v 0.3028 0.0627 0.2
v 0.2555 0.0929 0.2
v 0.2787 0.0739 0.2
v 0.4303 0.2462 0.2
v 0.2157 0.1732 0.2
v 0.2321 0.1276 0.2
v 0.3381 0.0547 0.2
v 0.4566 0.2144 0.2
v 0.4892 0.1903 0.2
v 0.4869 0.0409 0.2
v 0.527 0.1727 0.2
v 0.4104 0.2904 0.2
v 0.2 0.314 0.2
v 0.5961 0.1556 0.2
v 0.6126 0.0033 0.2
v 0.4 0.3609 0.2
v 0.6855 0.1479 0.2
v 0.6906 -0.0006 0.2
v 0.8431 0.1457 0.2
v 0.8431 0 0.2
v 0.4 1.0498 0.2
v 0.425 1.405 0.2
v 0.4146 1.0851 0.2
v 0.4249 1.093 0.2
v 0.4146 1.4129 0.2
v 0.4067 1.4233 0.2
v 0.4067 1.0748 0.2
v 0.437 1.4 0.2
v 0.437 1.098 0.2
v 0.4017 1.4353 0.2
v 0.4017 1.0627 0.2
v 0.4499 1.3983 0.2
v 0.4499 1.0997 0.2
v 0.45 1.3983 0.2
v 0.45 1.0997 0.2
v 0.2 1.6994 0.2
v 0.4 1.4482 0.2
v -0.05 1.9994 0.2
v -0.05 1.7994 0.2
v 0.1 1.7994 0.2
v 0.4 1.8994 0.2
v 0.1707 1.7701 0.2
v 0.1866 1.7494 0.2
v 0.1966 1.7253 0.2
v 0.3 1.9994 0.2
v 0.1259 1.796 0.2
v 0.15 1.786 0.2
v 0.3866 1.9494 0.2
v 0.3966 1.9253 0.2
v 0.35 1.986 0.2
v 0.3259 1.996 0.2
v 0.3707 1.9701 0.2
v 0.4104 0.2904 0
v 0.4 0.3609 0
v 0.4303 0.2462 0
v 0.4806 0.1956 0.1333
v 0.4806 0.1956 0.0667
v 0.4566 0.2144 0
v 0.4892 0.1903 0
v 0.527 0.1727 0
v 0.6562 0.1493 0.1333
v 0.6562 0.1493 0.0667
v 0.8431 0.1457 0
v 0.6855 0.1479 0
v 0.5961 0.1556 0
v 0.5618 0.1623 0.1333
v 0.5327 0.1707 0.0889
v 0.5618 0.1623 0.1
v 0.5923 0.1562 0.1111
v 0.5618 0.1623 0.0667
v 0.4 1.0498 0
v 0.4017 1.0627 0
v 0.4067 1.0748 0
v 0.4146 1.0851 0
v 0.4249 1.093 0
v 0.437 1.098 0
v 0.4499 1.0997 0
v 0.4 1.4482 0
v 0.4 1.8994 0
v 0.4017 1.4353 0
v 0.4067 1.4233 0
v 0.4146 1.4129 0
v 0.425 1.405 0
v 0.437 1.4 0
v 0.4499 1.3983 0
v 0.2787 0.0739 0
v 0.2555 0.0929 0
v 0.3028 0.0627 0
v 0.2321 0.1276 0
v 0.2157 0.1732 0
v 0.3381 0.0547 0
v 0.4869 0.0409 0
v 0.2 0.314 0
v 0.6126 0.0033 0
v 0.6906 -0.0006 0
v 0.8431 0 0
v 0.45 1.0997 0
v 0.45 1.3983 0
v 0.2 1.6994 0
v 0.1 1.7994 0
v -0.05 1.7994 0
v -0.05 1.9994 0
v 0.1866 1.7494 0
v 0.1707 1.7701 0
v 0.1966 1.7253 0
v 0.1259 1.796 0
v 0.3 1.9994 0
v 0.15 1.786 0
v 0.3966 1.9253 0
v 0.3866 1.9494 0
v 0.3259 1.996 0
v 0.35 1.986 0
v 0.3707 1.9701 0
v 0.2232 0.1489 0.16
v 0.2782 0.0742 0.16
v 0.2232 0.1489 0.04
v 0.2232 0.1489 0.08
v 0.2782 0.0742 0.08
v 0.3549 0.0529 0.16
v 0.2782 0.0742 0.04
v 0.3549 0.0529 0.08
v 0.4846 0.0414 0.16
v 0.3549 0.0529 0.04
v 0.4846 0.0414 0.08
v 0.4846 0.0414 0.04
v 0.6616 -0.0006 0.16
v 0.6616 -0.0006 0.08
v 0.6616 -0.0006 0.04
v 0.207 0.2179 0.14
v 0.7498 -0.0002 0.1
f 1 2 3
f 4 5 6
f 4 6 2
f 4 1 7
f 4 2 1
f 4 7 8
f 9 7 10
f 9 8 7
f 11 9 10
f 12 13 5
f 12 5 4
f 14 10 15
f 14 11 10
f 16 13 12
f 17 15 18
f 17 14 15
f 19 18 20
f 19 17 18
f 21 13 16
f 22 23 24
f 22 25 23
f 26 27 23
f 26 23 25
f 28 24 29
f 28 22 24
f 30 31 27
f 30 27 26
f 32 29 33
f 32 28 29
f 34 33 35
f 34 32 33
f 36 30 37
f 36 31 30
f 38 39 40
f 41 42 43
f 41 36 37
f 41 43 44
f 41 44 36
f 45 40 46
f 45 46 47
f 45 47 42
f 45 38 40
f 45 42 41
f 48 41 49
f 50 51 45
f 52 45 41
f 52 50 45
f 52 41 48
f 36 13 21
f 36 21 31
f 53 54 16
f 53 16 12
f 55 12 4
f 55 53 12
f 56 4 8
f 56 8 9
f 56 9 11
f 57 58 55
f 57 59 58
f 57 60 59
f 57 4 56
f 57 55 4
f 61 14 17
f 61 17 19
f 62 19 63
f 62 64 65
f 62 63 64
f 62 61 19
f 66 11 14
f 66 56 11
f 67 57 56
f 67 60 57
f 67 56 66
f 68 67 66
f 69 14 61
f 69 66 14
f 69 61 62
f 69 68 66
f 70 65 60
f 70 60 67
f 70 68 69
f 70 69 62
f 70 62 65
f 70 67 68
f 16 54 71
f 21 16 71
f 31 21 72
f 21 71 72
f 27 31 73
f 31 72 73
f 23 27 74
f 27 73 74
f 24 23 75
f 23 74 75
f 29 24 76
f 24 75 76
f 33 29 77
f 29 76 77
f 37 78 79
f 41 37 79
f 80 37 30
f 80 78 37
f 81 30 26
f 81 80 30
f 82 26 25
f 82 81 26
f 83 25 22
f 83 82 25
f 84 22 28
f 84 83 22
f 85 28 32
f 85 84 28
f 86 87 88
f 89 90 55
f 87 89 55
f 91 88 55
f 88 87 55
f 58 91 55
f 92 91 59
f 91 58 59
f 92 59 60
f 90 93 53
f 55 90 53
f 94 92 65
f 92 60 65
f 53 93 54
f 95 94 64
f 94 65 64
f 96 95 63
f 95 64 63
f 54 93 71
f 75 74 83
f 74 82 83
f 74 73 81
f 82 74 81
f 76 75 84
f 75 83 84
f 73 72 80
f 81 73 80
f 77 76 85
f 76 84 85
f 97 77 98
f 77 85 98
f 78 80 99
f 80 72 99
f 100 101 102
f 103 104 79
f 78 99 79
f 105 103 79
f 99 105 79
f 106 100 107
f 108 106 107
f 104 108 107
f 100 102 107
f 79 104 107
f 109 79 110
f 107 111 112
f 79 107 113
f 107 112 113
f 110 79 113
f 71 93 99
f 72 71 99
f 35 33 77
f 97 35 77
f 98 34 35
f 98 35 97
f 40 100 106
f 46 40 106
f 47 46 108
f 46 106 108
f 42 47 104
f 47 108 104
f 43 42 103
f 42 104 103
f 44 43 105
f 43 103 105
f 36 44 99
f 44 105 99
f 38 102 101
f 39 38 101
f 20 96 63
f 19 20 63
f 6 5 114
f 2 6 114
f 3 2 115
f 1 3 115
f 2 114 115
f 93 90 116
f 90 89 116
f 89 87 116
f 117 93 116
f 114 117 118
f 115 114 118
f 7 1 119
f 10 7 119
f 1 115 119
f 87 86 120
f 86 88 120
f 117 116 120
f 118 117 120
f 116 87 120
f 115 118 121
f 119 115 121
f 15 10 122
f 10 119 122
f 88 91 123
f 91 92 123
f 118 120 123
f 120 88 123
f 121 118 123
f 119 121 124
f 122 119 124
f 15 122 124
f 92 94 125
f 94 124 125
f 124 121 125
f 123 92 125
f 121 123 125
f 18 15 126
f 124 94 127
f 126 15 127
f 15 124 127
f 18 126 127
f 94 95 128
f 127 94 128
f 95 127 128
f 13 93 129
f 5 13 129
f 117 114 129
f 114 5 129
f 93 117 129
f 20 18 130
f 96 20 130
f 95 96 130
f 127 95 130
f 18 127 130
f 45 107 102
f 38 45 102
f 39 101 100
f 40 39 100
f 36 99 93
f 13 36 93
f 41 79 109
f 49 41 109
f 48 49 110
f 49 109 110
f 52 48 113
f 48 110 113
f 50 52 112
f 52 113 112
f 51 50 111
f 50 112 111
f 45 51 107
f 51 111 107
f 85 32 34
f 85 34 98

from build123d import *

# Parameters (mm, degrees)
BOSS_EXTRUDE1_DEPTH = 0.2
SKETCH2_W           = 0.2
SKETCH2_H           = 0.298604146
BOSS_EXTRUDE2_DEPTH = 0.05
FILLET1_R           = 0.05


with BuildPart() as part:
    # Sketch1 → Boss-Extrude1 (new body)
    with BuildSketch(Plane.XY):
        with BuildLine():
            Line((0.2, 0.699374902), (0.2, 0.3139984))
            add(Edge.make_bspline(
                [(0.2, 0.3139984), (0.205117782, 0.01722479), (0.336091093, 0.065107428), (0.524474595, 0.036055776), (0.597315342, -0.000257939), (0.727358441, -0.001083087), (0.736855282, 0.000318751), (0.843149125, 0)],
                knots=[0, 0, 0, 0, 0.386744718, 0.431584631, 0.602654437, 0.661634346, 1, 1, 1, 1], degree=3))
            Line((0.843149125, 0), (0.843149125, 0.145674502))
            add(Edge.make_bspline(
                [(0.4, 0.3609291), (0.405330144, 0.110576826), (0.678357666, 0.153432989), (0.843149125, 0.145674502)],
                knots=[0, 0, 0, 0, 1, 1, 1, 1], degree=3))
            Line((0.4, 0.3609291), (0.4, 0.948501248))
            Line((0.4, 0.948501248), (0.4, 1.899374902))
            ThreePointArc((0.4, 1.899374902), (0.370710678, 1.97008558), (0.3, 1.999374902))
            Line((0.3, 1.999374902), (-0.05, 1.999374902))
            Line((-0.05, 1.999374902), (-0.05, 1.799374902))
            Line((-0.05, 1.799374902), (0.1, 1.799374902))
            ThreePointArc((0.1, 1.799374902), (0.170710678, 1.77008558), (0.2, 1.699374902))
            Line((0.2, 1.699374902), (0.2, 0.699374902))
        make_face()
    extrude(amount=BOSS_EXTRUDE1_DEPTH)

    # Sketch2 → Boss-Extrude2 (add)
    with BuildSketch(Plane(origin=(0.4, 0, 0), x_dir=(0, 0, -1), z_dir=(1, 0, 0))):
        with Locations((-0.1, 1.249020091)):
            Rectangle(SKETCH2_W, SKETCH2_H)
    extrude(amount=BOSS_EXTRUDE2_DEPTH)

    # Fillet1
    fillet1_edges = [part.edges().sort_by_distance(p)[0] for p in [
        (0.4, 1.099718018, 0.1),
        (0.4, 1.398322164, 0.1),
    ]]
    fillet(fillet1_edges, radius=FILLET1_R - 0.0001)  # a hair under: the kernel refuses the full size


solid = part.part
